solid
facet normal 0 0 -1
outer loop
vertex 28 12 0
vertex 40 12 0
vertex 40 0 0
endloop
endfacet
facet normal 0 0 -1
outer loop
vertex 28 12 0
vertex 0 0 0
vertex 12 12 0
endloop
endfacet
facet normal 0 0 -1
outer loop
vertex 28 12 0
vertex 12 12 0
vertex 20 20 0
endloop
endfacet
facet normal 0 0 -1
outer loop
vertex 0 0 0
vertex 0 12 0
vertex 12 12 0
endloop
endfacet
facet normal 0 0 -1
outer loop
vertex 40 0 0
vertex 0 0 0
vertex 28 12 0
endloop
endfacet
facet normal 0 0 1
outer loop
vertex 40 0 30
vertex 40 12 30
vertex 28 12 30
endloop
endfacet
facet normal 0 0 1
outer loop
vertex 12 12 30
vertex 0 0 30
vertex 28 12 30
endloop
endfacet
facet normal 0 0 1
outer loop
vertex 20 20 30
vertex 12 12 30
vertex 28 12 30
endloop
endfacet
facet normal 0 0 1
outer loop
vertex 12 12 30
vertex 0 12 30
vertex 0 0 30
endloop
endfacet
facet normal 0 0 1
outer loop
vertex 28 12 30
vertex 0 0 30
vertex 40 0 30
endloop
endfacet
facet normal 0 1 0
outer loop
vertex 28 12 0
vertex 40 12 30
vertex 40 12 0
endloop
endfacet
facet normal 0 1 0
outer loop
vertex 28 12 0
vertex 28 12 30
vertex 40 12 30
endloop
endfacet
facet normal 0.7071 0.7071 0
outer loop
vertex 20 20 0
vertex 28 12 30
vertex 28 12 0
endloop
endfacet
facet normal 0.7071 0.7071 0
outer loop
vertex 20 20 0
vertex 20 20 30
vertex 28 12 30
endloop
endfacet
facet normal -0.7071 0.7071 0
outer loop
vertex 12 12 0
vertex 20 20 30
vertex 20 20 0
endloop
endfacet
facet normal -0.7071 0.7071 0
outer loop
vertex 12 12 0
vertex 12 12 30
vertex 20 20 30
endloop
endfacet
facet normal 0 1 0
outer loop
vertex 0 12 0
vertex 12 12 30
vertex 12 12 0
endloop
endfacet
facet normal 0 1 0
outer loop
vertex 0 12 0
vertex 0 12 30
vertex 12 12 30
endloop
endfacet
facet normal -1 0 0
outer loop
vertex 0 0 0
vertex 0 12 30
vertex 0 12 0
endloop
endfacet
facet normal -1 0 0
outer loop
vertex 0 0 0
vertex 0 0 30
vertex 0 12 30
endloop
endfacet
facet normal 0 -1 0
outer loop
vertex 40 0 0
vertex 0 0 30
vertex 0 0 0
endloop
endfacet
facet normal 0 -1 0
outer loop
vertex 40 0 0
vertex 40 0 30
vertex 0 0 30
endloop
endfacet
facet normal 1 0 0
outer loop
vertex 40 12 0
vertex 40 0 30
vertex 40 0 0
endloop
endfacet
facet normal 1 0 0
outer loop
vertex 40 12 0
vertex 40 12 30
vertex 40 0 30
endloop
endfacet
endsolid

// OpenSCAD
$fn = 32;

// ----------------------------------------------------------------------
// V guide rail: vrib, 40 mm wide
// ----------------------------------------------------------------------

// --- parameters (mm) ---
rail_w = 40;              // rail width, X
base_t = 12;              // base plate thickness
v_depth = 8;              // V feature depth / height
v_half_w = 8;             // half width of the V at the base face
plate_t = 30;             // rail length, Z (the extrusion height)

profile = [[0, 0], [40, 0], [40, 12], [28, 12], [20, 20], [12, 12], [0, 12]];  // primary outline, 7 points, counter clockwise

// --- the one profile operation ---
linear_extrude(height = plate_t) polygon(points = profile);
